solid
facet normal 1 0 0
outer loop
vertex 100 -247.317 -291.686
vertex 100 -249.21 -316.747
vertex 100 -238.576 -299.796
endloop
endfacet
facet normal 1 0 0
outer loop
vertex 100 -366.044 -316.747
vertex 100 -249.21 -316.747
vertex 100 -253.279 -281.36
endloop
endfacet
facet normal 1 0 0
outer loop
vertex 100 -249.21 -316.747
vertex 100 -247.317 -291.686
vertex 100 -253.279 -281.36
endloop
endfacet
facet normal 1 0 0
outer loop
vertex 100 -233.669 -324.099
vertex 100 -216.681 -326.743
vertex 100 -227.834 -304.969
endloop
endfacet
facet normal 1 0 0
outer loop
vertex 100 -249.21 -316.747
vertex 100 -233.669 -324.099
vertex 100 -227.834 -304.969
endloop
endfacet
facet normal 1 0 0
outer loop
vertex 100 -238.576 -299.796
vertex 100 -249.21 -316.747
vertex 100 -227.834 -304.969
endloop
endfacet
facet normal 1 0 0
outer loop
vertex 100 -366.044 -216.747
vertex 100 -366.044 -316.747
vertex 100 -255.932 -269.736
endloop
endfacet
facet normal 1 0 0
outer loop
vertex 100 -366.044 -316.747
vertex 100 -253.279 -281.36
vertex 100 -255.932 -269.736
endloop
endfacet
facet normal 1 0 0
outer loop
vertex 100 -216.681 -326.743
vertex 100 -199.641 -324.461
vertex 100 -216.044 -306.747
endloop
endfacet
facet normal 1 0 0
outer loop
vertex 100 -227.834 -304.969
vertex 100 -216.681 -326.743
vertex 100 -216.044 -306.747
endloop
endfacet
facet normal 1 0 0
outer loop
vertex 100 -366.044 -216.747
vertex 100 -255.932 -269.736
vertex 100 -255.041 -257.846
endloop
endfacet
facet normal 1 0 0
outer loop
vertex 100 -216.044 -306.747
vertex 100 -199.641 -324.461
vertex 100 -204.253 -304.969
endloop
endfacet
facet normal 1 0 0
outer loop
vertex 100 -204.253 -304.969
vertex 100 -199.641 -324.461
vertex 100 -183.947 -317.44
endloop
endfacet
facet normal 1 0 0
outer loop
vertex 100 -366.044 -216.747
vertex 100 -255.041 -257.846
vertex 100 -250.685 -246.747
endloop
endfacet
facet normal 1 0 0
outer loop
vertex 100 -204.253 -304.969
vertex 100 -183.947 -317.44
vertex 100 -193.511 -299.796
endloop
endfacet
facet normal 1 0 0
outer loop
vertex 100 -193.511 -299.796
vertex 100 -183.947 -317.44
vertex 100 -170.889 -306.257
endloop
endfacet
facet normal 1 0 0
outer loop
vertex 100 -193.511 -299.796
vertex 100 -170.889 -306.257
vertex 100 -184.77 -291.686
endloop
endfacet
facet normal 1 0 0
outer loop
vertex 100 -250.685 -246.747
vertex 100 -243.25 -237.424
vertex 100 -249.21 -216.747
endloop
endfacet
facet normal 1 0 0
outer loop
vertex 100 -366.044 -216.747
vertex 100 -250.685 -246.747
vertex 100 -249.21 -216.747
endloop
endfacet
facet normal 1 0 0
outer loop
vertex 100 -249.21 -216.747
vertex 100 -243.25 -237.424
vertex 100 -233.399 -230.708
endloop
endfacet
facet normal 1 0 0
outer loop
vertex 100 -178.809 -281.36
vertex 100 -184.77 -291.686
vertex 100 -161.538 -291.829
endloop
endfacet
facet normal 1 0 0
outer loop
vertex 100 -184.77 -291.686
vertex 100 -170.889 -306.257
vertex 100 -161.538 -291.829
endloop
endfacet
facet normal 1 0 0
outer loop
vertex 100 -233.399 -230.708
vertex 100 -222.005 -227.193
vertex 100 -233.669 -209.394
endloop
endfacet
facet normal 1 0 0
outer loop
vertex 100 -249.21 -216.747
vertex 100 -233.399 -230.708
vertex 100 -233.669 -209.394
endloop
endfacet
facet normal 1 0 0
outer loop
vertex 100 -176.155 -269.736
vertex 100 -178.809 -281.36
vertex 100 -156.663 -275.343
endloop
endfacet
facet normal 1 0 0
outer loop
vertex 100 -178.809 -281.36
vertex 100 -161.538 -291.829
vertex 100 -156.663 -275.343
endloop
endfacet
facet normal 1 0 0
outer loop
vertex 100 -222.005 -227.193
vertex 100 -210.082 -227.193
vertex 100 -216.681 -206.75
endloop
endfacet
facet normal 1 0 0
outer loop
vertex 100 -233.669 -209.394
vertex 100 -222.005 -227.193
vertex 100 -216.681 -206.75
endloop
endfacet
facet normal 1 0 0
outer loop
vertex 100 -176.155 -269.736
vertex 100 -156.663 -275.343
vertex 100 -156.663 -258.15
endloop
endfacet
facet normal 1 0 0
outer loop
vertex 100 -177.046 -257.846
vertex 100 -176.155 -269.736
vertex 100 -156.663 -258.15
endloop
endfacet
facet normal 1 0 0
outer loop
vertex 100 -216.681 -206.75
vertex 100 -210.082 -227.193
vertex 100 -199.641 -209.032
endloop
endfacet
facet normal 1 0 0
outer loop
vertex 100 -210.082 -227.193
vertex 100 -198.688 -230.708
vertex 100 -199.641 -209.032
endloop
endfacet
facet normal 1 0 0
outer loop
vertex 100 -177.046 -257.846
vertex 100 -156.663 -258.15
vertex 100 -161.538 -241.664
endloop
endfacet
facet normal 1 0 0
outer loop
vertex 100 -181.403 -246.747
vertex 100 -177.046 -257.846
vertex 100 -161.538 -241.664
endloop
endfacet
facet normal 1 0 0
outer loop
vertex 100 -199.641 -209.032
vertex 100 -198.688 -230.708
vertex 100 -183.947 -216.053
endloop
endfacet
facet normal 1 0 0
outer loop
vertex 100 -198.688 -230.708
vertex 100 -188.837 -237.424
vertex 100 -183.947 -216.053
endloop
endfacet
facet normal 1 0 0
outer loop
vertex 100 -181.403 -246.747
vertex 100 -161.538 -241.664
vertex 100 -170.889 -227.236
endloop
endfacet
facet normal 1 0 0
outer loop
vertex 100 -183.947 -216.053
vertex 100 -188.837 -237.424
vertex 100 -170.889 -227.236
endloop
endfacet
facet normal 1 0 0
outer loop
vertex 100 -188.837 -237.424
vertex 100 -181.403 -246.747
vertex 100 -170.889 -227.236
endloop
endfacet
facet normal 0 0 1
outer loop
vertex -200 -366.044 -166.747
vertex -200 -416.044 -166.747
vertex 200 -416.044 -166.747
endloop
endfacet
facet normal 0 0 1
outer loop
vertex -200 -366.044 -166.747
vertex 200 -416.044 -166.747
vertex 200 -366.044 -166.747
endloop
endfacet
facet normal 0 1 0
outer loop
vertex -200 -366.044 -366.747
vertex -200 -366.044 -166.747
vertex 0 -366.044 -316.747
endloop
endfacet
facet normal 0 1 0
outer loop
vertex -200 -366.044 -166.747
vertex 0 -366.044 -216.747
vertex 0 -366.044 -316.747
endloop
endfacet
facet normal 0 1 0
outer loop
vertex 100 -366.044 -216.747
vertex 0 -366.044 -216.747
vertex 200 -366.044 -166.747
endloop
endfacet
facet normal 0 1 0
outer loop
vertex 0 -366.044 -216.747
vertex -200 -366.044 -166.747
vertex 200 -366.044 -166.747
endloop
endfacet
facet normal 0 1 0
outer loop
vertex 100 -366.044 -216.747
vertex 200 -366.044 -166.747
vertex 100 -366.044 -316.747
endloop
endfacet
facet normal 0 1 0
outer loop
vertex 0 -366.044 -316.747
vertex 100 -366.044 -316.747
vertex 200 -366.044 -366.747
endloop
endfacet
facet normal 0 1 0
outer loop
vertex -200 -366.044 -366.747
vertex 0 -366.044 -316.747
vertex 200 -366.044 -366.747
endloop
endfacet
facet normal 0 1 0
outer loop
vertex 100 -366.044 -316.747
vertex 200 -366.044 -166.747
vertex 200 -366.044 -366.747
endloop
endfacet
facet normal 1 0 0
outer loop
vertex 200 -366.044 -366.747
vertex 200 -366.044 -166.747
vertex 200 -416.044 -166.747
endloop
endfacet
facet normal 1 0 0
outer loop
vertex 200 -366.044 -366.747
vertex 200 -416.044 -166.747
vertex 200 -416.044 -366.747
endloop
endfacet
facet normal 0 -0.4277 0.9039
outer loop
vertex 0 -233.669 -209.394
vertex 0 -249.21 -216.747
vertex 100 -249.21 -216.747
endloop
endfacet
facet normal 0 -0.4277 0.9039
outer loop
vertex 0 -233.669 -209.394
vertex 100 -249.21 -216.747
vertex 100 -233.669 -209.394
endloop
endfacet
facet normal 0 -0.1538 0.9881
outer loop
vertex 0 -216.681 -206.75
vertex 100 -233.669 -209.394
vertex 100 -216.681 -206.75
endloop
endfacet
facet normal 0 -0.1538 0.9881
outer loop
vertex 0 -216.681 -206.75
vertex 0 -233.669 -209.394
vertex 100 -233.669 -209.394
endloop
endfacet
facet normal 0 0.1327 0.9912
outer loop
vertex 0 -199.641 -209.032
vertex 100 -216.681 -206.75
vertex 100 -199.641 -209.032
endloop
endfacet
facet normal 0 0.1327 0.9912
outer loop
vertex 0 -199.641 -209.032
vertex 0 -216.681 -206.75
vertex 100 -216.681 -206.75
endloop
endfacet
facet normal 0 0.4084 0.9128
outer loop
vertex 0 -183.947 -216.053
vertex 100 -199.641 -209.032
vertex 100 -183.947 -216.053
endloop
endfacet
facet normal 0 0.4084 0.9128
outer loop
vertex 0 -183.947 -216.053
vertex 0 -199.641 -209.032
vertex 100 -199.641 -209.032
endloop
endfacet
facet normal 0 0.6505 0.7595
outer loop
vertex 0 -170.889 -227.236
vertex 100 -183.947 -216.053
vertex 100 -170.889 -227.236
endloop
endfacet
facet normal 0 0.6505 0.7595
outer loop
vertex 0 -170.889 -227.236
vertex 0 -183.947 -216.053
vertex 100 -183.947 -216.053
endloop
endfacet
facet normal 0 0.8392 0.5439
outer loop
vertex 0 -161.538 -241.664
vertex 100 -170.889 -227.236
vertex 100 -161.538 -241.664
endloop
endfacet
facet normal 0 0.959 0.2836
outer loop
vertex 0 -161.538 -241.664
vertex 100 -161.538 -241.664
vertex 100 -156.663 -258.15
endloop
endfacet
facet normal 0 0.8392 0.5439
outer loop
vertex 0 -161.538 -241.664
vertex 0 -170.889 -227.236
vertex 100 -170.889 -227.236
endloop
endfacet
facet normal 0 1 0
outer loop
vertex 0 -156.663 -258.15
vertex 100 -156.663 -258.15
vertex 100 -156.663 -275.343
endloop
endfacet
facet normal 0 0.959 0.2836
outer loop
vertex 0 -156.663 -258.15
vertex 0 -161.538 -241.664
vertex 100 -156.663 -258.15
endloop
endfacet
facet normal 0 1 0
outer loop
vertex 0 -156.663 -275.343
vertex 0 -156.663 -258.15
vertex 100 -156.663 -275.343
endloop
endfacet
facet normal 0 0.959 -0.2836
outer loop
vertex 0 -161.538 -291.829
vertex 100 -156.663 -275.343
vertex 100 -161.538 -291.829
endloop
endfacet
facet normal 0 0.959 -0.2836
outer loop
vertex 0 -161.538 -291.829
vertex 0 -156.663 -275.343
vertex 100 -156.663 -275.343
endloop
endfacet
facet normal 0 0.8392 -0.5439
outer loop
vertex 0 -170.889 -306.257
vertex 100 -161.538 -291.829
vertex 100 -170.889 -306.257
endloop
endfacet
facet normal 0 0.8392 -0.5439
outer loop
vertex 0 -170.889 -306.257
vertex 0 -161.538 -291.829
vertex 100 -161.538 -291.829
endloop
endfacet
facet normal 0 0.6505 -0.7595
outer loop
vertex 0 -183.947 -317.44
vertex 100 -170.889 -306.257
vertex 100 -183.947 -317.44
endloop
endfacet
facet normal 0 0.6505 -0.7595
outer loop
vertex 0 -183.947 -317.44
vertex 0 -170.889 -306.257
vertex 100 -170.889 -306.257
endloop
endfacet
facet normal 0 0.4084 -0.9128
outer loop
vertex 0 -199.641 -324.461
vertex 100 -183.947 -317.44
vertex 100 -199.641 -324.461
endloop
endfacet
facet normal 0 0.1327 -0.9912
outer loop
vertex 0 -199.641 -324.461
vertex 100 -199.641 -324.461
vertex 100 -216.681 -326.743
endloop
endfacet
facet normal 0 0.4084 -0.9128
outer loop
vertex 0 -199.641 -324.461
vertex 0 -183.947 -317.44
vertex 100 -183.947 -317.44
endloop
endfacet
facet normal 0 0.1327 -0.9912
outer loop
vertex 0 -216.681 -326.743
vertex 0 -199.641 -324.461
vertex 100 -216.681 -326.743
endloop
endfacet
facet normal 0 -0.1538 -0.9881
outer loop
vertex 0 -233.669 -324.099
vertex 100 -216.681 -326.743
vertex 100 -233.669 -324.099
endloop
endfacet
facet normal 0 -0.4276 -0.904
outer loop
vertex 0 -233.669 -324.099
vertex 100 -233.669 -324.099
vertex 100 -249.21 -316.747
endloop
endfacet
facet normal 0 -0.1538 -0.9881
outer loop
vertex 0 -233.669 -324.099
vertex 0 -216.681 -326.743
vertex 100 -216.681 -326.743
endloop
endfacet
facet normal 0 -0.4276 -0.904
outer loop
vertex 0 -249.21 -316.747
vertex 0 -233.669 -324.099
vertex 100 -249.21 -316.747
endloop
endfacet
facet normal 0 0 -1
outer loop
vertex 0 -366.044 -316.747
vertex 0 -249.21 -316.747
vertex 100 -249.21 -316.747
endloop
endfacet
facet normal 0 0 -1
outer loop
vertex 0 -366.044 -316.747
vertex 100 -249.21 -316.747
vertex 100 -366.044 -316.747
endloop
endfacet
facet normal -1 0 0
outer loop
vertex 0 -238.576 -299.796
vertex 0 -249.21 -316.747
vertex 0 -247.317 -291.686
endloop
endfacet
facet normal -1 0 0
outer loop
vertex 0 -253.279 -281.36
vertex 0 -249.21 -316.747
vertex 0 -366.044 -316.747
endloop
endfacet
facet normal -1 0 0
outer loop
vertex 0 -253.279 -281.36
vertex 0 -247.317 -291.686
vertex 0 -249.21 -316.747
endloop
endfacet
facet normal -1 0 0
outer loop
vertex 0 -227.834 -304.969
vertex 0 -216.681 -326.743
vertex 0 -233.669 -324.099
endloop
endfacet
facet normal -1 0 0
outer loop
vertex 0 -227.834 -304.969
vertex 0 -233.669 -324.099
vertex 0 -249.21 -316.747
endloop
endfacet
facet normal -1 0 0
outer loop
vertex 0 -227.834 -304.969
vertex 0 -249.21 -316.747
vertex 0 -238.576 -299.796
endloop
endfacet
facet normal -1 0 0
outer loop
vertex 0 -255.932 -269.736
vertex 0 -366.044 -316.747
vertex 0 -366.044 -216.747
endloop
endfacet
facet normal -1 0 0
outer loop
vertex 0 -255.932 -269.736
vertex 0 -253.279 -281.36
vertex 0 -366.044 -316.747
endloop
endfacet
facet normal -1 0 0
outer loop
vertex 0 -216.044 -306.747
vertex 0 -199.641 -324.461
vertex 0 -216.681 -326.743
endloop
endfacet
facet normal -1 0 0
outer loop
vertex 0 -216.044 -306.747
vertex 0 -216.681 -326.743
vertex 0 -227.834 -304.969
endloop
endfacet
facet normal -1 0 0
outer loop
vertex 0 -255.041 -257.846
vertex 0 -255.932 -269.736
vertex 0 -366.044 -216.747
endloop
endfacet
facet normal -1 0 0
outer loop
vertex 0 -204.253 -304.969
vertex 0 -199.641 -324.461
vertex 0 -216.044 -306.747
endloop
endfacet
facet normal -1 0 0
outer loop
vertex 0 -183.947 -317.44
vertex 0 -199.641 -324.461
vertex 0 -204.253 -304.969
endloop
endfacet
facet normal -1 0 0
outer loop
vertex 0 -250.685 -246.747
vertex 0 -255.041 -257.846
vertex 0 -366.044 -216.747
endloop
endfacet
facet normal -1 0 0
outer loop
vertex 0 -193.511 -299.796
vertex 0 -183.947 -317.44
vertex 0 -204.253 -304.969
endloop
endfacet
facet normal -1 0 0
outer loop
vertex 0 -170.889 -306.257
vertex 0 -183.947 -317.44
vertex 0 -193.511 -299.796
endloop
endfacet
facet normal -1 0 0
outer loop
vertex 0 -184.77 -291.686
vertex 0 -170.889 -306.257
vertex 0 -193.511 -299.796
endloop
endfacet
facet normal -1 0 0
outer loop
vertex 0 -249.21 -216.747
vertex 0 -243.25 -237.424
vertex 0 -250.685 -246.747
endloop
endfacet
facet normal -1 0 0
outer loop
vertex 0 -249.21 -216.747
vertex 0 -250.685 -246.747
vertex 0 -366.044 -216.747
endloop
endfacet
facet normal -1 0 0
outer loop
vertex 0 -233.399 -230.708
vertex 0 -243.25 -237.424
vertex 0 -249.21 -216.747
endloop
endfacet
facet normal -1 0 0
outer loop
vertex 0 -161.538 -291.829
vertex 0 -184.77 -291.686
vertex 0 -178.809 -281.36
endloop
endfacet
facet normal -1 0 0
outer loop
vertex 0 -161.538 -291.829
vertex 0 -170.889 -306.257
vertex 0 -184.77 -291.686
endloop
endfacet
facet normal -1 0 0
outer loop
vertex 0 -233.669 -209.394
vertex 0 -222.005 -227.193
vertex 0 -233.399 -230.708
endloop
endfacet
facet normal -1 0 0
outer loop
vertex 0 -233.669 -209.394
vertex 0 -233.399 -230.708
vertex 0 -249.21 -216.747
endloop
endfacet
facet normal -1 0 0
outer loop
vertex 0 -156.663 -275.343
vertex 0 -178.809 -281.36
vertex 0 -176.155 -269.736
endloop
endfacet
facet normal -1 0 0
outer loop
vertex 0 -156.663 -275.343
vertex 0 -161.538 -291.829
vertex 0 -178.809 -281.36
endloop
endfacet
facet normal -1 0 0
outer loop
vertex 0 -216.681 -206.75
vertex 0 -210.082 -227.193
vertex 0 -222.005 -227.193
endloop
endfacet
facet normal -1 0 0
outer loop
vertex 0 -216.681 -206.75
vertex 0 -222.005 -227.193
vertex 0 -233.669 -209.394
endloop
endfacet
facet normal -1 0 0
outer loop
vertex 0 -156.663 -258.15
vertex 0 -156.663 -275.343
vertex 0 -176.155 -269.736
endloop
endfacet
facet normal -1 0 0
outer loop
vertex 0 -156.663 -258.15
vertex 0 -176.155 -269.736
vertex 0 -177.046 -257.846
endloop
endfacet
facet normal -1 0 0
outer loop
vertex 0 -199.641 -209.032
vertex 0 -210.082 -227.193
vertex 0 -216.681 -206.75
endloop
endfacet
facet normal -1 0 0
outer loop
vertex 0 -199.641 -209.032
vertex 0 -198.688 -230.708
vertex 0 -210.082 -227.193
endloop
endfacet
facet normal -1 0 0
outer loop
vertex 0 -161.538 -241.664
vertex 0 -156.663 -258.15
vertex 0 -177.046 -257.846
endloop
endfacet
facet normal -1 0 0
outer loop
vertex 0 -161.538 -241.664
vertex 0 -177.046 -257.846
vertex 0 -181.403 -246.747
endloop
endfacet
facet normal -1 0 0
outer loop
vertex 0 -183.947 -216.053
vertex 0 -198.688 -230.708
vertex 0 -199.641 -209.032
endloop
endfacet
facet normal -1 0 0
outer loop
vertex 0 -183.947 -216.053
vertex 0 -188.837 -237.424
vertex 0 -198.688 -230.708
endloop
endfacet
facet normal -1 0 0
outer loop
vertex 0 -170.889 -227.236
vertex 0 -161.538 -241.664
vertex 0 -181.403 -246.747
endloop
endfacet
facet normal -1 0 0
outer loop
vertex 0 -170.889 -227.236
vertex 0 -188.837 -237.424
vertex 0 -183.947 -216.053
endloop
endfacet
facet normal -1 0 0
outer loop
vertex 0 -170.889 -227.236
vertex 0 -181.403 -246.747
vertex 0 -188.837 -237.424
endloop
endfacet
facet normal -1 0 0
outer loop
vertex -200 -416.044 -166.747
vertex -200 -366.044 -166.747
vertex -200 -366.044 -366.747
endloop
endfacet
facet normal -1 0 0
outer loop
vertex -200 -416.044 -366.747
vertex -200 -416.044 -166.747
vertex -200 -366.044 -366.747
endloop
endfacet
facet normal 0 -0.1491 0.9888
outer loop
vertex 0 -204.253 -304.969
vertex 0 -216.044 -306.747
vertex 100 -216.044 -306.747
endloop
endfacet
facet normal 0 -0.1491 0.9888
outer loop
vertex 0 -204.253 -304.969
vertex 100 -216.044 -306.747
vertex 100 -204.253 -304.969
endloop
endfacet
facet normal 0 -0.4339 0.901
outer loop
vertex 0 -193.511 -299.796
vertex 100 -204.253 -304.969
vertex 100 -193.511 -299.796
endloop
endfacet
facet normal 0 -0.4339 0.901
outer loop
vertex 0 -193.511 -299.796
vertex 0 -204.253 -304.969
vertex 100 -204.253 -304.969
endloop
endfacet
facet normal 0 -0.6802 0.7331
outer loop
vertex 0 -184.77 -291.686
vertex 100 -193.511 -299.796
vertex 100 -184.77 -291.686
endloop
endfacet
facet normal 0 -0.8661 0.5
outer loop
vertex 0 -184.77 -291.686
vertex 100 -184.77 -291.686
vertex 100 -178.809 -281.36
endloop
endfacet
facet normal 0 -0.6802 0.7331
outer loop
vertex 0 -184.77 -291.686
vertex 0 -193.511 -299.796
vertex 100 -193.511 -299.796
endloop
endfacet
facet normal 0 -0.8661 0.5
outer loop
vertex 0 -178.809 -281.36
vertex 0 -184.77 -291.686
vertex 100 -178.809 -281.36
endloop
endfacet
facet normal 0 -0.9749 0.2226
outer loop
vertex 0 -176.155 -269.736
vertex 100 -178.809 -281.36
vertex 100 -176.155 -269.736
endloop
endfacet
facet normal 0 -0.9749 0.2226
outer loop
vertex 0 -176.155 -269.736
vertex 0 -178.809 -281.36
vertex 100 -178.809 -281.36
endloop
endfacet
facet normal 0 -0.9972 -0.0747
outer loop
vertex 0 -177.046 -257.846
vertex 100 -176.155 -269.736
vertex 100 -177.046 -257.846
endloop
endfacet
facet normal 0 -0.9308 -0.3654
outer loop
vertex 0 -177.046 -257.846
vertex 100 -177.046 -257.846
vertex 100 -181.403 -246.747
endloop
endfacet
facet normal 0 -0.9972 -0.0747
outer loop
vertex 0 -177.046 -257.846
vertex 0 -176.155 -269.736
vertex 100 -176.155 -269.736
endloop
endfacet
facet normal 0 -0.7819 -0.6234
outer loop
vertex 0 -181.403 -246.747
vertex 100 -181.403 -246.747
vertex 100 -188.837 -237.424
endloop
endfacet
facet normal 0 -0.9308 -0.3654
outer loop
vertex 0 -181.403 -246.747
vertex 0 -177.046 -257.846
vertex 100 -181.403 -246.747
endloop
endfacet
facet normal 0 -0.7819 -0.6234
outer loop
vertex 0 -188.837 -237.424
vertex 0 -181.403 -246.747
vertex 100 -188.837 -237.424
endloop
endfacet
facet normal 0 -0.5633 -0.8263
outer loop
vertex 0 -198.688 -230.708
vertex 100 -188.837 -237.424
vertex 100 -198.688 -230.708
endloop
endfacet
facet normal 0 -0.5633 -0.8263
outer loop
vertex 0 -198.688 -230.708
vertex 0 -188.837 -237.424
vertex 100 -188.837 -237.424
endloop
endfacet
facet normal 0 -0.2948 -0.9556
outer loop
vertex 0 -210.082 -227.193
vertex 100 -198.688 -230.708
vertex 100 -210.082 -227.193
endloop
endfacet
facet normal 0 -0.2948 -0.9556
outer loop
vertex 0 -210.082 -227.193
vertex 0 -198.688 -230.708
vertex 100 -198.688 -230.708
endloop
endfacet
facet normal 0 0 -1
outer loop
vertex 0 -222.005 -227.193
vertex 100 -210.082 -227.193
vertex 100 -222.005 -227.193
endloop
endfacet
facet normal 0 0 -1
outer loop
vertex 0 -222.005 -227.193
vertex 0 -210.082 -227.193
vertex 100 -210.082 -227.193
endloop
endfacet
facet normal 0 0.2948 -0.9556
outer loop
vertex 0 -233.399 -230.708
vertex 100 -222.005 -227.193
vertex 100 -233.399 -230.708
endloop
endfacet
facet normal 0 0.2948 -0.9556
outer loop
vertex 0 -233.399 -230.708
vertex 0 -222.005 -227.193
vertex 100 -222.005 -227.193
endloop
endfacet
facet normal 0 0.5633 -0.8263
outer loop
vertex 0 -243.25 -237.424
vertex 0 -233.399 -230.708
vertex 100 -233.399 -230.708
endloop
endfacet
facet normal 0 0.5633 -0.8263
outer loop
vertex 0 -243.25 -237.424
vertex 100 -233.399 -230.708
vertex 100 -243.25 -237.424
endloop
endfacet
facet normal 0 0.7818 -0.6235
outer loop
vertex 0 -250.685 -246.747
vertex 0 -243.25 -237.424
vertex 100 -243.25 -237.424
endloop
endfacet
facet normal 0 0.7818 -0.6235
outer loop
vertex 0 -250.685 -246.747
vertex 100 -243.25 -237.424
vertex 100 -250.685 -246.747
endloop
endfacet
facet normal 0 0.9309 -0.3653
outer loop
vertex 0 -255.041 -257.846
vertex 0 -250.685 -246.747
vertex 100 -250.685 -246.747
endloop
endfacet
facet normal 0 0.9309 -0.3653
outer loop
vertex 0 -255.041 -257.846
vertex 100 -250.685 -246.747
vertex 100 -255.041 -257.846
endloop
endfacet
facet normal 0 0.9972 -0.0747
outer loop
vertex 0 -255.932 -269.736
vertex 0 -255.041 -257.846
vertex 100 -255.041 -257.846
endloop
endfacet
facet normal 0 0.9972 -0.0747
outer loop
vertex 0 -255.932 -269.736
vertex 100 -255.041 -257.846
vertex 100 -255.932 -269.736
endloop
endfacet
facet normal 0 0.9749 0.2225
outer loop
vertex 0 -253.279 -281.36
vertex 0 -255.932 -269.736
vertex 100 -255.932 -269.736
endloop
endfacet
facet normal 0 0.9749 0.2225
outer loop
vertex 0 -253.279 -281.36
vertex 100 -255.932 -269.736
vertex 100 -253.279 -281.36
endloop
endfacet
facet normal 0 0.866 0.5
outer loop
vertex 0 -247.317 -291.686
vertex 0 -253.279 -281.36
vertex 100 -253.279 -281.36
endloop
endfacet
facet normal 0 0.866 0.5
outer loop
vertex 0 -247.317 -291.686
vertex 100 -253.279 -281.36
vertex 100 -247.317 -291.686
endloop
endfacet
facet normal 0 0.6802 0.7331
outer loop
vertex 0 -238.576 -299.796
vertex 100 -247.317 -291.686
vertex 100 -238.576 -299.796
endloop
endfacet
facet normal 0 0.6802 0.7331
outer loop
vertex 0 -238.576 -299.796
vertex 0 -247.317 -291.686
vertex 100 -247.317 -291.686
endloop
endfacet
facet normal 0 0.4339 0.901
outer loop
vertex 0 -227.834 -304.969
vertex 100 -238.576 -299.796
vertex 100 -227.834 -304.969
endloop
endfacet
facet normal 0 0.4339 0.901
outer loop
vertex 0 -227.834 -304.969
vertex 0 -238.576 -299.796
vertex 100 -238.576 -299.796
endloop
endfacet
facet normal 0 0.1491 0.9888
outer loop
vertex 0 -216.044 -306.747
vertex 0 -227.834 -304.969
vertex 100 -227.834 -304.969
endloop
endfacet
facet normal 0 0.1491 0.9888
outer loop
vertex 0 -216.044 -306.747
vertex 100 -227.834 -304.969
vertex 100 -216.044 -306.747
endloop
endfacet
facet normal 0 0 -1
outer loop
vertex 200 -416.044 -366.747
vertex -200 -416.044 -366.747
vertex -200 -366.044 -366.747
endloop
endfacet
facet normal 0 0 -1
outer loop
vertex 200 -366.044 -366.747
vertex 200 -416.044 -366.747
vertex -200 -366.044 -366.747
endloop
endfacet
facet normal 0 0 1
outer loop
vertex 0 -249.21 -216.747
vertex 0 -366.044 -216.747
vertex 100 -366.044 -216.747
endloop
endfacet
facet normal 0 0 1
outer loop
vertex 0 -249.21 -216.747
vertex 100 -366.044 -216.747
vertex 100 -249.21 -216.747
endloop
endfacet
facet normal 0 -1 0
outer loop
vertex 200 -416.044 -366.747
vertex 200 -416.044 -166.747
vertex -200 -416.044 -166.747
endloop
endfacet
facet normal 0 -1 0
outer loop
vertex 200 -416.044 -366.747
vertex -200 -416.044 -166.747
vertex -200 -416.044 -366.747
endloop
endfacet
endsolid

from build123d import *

# Parameters (mm, degrees)
LINKFRAME_R         = 40
BOSS_EXTRUDE1_DEPTH = 100
EXTENDEDPRESS_W     = 200
EXTENDEDPRESS_H     = 50
BOSS_EXTRUDE2_DEPTH = 200


with BuildPart() as part:
    # LinkFrame → Boss-Extrude1 (new body)
    with BuildSketch(Plane(origin=(0, 0, 0), x_dir=(0, 0, -1), z_dir=(1, 0, 0))):
        with BuildLine():
            Line((316.746524862, -249.209808828), (316.746524862, -366.043560924))
            Line((316.746524862, -366.043560924), (366.746524862, -366.043560924))
            Line((366.746524862, -366.043560924), (366.746524862, -416.043560924))
            Line((366.746524862, -416.043560924), (166.746524862, -416.043560924))
            Line((166.746524862, -416.043560924), (166.746524862, -366.043560924))
            Line((166.746524862, -366.043560924), (216.746524862, -366.043560924))
            Line((216.746524862, -366.043560924), (216.746524862, -249.209808828))
            ThreePointArc((216.746524862, -249.209808828), (266.746524862, -156.043560924), (316.746524862, -249.209808828))
        make_face()
        with Locations((266.746524862, -216.043560924)):
            Circle(LINKFRAME_R, mode=Mode.SUBTRACT)
    extrude(amount=BOSS_EXTRUDE1_DEPTH)

    # ExtendedPress → Boss-Extrude2 (add, symmetric)
    with BuildSketch(Plane(origin=(0, 0, 0), x_dir=(0, 0, -1), z_dir=(1, 0, 0))):
        with Locations((266.746524862, -391.043560924)):
            Rectangle(EXTENDEDPRESS_W, EXTENDEDPRESS_H)
    extrude(amount=BOSS_EXTRUDE2_DEPTH, both=True)


solid = part.part
